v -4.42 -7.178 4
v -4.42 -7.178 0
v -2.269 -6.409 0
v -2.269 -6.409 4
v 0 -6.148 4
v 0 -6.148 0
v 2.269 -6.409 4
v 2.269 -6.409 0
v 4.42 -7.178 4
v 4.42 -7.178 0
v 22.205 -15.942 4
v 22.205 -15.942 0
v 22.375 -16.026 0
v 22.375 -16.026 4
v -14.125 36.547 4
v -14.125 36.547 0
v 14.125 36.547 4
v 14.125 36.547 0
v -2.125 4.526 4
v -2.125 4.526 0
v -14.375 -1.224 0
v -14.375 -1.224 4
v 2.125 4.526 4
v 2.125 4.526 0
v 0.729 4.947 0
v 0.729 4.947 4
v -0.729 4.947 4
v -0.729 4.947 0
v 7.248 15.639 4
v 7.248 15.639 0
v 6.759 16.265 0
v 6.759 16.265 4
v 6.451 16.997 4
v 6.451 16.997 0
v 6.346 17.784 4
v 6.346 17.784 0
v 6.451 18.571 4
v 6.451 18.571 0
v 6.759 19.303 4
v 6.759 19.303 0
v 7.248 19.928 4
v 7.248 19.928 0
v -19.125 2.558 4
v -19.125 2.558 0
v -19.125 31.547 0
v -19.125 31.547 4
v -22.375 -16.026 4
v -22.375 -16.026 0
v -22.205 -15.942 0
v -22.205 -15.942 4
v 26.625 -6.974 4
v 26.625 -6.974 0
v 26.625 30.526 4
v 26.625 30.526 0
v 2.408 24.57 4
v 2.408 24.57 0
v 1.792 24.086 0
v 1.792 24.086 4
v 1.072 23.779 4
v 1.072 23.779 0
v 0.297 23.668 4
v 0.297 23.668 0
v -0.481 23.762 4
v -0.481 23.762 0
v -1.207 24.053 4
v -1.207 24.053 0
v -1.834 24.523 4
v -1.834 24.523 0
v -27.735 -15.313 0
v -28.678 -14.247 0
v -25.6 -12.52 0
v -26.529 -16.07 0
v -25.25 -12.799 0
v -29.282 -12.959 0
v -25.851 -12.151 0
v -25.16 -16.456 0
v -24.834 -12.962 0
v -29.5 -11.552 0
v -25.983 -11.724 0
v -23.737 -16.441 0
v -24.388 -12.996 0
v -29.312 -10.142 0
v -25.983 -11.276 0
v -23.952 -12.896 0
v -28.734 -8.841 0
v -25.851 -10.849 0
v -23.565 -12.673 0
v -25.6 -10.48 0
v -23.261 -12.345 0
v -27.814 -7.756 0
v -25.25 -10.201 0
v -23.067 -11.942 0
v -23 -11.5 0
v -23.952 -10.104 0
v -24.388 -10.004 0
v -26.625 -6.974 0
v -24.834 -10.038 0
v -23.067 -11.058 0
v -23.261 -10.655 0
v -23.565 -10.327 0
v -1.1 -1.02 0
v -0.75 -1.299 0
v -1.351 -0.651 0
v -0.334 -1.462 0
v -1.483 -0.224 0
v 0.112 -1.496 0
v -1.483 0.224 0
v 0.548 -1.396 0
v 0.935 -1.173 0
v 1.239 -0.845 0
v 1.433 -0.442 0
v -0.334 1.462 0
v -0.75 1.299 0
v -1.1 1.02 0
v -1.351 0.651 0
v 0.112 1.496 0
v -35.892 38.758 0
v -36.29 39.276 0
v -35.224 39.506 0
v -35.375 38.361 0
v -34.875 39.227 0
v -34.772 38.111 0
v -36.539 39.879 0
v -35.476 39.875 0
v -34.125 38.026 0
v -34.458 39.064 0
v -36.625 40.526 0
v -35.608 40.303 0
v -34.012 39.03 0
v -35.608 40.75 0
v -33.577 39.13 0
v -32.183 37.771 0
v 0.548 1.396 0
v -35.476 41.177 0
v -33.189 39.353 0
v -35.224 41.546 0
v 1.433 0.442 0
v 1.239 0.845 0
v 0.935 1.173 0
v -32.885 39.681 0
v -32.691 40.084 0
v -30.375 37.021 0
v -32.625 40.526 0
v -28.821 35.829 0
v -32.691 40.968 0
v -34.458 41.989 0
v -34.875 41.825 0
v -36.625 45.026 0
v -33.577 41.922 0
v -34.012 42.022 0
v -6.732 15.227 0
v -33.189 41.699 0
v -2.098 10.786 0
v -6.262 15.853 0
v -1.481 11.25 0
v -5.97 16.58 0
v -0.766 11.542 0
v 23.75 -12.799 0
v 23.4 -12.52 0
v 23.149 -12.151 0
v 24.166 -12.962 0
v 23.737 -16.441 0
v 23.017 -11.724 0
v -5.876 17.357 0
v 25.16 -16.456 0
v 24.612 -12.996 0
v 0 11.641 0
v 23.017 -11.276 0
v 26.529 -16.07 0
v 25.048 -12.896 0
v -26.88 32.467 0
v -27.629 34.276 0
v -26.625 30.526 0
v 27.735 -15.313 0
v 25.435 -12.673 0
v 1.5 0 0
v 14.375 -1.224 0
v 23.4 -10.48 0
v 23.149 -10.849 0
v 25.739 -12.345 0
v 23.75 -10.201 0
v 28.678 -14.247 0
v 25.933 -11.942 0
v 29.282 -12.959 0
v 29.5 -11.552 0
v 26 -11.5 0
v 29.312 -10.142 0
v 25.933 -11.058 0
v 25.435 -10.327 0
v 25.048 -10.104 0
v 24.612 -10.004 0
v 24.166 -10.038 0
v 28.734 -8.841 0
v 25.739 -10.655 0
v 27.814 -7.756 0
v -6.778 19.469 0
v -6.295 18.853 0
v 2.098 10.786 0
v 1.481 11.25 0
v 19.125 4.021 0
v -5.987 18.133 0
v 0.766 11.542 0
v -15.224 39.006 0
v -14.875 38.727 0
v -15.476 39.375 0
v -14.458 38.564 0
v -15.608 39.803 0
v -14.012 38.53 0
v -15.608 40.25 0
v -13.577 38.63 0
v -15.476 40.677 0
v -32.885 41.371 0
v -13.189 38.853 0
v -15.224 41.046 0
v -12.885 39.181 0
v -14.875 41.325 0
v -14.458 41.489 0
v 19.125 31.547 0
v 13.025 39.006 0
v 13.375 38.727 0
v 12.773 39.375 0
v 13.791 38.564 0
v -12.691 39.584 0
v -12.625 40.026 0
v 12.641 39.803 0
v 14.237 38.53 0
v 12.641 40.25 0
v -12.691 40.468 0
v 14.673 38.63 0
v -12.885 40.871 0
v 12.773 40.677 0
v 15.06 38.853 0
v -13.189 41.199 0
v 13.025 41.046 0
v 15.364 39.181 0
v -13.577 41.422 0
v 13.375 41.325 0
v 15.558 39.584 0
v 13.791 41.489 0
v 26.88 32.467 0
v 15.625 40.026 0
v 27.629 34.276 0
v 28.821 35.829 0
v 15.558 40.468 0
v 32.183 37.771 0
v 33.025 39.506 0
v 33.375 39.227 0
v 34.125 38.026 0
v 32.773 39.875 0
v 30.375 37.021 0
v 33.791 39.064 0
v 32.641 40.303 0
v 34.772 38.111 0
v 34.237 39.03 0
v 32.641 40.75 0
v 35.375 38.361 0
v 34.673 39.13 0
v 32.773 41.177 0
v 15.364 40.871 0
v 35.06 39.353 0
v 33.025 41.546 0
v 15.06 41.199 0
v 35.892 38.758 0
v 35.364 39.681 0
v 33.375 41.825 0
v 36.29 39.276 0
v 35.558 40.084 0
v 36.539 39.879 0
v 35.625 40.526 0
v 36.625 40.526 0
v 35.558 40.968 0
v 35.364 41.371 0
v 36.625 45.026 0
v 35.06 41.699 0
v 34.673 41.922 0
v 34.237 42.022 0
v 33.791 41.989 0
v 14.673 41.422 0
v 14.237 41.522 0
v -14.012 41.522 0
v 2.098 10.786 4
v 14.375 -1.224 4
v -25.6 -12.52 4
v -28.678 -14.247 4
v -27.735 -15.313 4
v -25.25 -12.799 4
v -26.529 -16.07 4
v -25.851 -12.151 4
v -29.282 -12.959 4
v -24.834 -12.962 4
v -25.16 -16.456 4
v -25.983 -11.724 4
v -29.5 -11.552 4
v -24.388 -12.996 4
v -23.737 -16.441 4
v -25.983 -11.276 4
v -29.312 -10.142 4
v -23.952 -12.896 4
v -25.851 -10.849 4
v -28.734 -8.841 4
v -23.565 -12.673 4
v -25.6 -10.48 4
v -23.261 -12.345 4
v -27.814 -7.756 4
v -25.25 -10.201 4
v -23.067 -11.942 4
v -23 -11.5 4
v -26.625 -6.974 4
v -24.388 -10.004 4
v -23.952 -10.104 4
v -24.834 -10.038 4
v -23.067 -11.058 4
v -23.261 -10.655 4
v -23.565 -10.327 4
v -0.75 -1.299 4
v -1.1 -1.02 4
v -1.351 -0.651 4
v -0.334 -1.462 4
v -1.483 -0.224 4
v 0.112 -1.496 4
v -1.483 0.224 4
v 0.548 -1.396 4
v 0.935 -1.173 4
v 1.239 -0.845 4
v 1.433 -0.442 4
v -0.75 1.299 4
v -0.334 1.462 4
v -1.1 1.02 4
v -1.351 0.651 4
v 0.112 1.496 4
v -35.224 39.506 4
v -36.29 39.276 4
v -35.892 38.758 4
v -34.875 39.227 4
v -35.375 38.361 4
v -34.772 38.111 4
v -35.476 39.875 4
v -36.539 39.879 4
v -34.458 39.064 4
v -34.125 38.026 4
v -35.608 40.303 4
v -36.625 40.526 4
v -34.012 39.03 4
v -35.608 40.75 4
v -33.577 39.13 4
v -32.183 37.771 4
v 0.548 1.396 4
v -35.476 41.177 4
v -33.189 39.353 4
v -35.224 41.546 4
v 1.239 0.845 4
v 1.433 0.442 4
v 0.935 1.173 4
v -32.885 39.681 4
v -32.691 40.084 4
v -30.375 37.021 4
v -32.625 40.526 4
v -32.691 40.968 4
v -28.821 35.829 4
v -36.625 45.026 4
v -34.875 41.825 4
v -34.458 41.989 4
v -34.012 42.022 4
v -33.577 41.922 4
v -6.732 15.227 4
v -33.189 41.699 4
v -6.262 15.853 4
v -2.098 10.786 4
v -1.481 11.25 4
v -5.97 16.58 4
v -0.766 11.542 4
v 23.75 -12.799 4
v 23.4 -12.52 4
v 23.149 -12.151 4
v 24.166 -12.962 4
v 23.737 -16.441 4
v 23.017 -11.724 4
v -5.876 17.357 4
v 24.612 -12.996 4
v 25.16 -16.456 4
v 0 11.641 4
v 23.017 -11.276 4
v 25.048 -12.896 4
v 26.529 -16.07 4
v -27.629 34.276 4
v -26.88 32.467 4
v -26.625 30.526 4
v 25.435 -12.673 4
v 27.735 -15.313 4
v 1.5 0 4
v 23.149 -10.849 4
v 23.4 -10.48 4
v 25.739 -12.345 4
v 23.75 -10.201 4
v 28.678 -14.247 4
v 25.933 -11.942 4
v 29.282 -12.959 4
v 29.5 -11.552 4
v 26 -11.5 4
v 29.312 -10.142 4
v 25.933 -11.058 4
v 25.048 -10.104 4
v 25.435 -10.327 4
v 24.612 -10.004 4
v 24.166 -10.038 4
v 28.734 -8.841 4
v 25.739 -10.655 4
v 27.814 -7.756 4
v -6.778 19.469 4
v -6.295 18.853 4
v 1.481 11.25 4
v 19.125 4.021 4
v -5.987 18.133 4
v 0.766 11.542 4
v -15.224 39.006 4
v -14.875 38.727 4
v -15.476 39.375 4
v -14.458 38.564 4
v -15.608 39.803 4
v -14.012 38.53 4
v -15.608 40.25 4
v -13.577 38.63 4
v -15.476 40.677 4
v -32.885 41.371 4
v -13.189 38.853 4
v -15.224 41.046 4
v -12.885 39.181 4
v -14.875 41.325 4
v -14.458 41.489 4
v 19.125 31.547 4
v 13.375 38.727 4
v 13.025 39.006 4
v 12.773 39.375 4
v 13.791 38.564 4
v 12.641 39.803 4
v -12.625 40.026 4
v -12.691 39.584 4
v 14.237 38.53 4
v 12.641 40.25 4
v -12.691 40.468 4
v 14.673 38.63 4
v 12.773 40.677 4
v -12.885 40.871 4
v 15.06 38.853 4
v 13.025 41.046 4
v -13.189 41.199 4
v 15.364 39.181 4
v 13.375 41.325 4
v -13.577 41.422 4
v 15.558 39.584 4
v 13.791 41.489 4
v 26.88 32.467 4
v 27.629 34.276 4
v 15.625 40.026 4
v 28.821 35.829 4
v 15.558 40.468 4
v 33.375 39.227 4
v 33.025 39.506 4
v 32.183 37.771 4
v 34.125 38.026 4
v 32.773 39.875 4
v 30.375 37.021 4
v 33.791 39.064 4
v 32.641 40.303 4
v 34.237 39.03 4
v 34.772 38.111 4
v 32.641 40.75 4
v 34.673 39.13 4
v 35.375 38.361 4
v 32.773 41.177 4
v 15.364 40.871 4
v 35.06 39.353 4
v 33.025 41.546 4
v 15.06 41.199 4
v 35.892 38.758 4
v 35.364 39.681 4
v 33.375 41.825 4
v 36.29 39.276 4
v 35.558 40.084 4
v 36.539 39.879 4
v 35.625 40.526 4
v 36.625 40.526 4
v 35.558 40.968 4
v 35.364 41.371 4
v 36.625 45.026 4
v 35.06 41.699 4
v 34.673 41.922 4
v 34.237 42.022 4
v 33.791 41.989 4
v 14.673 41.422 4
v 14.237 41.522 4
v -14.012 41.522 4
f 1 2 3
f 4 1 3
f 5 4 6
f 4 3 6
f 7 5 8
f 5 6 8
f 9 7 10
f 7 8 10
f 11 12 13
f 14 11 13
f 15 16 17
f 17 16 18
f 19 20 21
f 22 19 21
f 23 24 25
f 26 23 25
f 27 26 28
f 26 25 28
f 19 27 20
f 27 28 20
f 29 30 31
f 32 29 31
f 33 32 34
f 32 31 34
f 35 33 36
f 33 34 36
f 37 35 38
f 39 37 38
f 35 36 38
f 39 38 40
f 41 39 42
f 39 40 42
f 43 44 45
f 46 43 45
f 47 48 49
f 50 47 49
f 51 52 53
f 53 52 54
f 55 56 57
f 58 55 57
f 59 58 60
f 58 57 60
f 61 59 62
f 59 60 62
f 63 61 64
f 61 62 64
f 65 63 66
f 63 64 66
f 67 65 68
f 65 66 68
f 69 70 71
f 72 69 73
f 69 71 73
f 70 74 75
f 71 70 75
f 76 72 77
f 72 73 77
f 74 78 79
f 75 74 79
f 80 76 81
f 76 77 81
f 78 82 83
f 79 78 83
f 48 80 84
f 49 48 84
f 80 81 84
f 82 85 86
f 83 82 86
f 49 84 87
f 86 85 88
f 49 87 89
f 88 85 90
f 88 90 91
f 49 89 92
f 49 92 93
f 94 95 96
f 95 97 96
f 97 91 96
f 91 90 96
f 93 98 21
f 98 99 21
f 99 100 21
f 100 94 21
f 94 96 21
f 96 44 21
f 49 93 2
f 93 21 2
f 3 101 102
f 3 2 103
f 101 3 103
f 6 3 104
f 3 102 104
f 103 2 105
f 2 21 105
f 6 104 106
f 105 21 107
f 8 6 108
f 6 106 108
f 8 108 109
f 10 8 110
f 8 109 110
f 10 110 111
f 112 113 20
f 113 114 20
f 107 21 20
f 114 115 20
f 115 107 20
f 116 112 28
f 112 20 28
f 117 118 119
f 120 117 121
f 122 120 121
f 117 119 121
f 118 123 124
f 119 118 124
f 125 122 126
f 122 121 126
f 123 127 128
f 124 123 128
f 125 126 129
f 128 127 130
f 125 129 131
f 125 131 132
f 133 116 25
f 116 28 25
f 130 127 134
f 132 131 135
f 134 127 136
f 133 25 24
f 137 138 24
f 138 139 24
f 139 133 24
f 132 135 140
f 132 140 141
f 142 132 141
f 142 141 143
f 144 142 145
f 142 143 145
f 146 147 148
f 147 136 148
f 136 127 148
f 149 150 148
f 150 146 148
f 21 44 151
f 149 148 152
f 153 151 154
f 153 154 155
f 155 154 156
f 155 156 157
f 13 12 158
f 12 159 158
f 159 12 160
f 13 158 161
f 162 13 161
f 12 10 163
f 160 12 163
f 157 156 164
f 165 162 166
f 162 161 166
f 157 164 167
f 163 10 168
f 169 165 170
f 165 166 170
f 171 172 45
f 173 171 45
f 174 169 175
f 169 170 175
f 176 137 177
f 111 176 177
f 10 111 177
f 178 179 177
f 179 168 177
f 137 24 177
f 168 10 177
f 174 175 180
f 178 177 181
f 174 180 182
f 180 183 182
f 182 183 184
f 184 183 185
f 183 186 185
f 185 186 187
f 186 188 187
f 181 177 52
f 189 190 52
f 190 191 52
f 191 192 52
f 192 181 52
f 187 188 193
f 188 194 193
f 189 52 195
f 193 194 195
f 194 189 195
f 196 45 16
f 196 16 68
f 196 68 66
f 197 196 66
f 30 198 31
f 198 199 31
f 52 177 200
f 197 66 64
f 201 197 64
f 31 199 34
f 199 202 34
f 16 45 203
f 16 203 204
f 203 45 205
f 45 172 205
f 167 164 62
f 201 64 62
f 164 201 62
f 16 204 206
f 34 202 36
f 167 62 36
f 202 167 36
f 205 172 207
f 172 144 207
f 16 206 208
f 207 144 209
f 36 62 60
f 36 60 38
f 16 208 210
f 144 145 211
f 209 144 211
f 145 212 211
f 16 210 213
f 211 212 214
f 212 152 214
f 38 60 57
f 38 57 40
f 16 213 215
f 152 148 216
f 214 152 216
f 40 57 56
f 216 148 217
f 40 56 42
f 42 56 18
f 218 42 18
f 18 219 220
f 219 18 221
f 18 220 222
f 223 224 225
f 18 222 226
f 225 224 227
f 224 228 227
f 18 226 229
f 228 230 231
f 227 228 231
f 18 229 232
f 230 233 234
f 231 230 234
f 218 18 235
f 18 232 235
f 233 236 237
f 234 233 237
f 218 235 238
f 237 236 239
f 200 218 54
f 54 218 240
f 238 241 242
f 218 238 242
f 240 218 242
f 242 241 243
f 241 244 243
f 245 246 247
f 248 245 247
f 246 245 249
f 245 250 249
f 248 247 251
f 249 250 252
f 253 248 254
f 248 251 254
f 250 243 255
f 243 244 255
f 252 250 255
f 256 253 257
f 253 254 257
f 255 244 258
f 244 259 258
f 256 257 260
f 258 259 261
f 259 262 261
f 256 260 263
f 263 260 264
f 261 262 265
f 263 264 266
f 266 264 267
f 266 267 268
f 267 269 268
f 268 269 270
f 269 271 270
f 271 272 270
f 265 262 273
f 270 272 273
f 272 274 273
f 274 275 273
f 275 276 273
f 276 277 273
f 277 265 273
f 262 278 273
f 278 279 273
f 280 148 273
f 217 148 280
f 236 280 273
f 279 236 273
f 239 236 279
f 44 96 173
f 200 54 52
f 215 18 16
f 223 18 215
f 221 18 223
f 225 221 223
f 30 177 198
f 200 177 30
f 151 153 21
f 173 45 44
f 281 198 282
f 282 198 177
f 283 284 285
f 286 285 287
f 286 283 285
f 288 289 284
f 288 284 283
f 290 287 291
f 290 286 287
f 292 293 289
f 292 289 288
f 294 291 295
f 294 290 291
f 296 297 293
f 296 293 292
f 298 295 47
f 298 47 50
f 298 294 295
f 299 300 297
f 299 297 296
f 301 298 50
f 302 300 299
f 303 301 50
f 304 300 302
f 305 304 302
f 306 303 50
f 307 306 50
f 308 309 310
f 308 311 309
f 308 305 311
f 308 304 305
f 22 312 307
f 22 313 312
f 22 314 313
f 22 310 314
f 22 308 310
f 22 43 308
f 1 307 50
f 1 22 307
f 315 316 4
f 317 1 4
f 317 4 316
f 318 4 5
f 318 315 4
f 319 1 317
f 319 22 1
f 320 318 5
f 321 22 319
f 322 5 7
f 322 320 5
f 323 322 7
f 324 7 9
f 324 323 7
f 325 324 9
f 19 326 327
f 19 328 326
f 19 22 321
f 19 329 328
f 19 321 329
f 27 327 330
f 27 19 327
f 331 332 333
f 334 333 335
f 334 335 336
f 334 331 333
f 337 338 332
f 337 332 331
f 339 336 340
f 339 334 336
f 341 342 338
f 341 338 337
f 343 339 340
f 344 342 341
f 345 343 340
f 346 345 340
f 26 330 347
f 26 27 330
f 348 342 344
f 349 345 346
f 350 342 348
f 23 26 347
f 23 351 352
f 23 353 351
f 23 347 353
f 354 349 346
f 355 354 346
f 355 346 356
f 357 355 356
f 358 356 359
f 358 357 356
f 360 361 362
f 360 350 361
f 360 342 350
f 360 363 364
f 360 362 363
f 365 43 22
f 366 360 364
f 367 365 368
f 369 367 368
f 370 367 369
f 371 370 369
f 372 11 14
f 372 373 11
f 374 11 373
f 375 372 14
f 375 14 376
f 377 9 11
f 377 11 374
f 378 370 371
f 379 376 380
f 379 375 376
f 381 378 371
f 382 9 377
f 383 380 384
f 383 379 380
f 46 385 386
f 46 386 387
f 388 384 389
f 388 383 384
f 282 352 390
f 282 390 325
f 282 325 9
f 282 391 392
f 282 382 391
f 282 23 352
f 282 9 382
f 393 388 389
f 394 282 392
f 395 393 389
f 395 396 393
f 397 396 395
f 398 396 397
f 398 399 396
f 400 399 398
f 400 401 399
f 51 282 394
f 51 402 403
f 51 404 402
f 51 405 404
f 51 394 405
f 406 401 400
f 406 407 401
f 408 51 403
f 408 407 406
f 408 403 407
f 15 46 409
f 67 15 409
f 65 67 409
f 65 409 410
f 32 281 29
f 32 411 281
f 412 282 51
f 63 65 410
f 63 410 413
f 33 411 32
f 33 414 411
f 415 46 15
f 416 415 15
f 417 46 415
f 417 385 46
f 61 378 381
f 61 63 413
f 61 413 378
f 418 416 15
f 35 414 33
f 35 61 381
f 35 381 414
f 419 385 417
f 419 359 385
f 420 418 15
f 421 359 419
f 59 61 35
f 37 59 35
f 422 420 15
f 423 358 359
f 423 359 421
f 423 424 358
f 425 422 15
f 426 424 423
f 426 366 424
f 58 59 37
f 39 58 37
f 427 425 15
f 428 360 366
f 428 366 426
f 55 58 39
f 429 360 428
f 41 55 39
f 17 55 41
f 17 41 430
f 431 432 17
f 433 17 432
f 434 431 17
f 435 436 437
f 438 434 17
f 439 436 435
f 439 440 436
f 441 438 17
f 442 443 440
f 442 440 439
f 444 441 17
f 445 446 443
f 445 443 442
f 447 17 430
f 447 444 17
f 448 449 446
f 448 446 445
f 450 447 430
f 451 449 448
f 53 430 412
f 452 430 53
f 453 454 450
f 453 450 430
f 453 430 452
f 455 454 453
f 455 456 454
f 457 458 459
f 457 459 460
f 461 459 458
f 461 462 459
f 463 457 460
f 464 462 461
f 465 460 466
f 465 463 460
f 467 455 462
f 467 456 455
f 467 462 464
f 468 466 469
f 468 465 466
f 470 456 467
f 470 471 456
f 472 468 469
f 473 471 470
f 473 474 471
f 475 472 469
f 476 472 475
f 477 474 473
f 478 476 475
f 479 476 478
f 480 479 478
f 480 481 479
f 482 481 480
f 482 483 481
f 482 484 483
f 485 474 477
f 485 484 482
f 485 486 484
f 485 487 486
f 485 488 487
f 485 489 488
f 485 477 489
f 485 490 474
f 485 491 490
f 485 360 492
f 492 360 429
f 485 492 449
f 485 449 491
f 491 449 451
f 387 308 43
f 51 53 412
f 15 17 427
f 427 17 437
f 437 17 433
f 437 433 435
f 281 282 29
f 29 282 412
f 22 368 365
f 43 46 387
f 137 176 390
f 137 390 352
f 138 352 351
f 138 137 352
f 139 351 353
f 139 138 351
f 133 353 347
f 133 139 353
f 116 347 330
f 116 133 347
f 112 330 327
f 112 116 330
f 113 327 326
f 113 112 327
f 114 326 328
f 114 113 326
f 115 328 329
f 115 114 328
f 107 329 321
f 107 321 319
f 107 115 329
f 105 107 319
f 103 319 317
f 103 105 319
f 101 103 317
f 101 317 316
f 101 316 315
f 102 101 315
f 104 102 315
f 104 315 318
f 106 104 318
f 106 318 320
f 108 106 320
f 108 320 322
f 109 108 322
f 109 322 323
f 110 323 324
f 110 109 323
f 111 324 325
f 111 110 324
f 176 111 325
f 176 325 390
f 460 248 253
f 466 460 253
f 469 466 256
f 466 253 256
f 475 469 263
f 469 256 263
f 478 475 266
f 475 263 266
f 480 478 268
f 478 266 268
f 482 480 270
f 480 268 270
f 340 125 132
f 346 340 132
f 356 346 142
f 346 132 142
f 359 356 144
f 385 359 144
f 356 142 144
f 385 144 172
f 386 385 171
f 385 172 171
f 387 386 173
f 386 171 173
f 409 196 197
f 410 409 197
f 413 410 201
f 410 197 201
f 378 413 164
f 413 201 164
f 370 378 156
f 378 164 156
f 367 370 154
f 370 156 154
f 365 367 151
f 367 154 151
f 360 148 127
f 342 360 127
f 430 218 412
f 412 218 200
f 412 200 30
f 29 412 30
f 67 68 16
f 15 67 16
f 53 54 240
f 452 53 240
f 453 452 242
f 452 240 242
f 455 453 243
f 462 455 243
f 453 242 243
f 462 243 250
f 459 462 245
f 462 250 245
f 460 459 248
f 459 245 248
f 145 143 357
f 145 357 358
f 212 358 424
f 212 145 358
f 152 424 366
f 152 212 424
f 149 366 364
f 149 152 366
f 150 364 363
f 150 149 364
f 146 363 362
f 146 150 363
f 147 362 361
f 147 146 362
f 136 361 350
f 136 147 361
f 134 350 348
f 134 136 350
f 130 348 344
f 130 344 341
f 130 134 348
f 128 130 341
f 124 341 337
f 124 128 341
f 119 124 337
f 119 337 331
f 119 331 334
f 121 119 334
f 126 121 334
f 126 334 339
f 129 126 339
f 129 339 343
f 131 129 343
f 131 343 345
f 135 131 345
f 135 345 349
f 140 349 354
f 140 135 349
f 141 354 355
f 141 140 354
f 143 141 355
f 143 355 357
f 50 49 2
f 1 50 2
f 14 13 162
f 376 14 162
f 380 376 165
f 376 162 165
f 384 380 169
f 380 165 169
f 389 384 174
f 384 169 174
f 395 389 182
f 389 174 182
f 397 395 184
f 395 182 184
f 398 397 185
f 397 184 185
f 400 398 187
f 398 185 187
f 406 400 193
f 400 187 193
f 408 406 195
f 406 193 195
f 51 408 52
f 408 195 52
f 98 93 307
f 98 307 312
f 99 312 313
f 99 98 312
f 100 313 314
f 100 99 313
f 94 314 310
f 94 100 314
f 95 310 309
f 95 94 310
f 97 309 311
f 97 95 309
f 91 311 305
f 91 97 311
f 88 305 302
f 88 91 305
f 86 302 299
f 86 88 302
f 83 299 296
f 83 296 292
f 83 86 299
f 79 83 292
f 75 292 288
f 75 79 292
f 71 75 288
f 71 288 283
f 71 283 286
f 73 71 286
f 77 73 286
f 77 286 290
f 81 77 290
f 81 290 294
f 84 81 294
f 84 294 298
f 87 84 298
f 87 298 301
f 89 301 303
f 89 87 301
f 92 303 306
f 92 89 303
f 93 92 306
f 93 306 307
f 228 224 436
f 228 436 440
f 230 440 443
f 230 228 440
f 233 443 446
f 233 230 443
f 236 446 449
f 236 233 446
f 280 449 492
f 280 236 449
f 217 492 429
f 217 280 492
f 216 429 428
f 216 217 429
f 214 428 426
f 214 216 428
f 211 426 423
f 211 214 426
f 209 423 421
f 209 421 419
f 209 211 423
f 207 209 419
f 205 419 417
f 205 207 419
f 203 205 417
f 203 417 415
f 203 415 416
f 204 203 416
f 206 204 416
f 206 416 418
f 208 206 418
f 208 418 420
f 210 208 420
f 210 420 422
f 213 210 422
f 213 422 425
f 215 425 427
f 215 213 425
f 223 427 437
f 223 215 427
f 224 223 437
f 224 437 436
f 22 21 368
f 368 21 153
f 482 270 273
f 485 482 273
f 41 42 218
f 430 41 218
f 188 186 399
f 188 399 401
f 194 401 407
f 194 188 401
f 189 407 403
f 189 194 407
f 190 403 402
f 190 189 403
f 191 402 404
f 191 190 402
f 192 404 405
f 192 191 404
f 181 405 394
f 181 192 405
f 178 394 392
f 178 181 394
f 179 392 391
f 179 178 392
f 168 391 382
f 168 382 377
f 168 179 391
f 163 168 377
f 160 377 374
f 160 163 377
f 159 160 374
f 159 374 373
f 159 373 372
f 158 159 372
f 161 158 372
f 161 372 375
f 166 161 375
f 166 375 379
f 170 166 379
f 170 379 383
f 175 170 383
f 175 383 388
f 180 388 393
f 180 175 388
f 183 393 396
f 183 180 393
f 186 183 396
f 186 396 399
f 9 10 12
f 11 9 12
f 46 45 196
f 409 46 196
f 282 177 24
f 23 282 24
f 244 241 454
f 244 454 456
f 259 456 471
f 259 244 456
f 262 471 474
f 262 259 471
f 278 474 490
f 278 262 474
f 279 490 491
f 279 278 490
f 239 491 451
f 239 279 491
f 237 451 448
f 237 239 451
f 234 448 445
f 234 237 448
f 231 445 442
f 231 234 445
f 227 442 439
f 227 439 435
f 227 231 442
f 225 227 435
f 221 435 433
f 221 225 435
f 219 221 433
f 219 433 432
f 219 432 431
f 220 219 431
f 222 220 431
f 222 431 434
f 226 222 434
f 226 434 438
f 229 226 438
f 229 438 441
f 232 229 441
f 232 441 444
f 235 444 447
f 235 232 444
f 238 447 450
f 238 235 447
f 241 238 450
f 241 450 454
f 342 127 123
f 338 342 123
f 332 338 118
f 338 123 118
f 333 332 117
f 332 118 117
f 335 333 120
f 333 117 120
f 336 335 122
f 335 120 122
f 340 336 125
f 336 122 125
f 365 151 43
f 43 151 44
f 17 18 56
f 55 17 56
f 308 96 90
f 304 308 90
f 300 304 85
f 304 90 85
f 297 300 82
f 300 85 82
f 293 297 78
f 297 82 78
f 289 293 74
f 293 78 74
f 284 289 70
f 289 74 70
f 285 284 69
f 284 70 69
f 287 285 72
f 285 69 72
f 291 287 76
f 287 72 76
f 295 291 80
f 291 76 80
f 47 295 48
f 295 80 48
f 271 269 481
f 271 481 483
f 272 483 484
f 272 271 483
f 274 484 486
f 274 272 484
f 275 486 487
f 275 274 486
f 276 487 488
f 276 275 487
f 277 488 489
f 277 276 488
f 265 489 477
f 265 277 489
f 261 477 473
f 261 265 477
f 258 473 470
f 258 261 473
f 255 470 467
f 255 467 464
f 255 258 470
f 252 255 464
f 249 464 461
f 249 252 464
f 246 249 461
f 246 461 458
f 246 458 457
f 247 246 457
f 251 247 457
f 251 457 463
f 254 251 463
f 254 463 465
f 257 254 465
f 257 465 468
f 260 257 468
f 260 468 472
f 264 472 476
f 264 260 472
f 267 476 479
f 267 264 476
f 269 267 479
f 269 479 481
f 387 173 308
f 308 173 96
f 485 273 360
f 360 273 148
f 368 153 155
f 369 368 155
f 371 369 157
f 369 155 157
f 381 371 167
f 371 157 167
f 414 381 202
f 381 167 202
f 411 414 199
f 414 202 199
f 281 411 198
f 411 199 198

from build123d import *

# Parameters (mm, degrees)
SKETCH1_R           = 1.5
BOSS_EXTRUDE1_DEPTH = 4


with BuildPart() as part:
    # Sketch1 → Boss-Extrude1 (new body)
    # profile 1 of 2: a face of its own
    with BuildSketch(Plane.XY):
        with BuildLine():
            Line((0, 43.02618472), (-22, 43.02618472))
            Line((-22, 43.02618472), (-34.124535685, 43.02618472))
            ThreePointArc((-34.124535685, 43.02618472), (-35.892302638, 42.293951673), (-36.624535685, 40.52618472))
            ThreePointArc((-36.624535685, 40.52618472), (-35.892302638, 38.758417767), (-34.124535685, 38.02618472))
            ThreePointArc((-34.124535685, 38.02618472), (-28.821234826, 35.829485579), (-26.624535685, 30.52618472))
            Line((-26.624535685, 30.52618472), (-26.624535685, -6.97381528))
            ThreePointArc((-26.624535685, -6.97381528), (-29.02618472, -13.624535685), (-22.375464315, -16.02618472))
            Line((-22.375464315, -16.02618472), (-22.205082013, -15.942223704))
            Line((-22.205082013, -15.942223704), (-4.420251148, -7.178212035))
            ThreePointArc((-4.420251148, -7.178212035), (0, -6.148238779), (4.420251148, -7.178212035))
            Line((4.420251148, -7.178212035), (22.205082013, -15.942223704))
            Line((22.205082013, -15.942223704), (22.375464315, -16.02618472))
            ThreePointArc((22.375464315, -16.02618472), (29.02618472, -13.624535685), (26.624535685, -6.97381528))
            Line((26.624535685, -6.97381528), (26.624535685, 30.52618472))
            ThreePointArc((26.624535685, 30.52618472), (28.821234826, 35.829485579), (34.124535685, 38.02618472))
            ThreePointArc((34.124535685, 38.02618472), (35.892302638, 38.758417767), (36.624535685, 40.52618472))
            ThreePointArc((36.624535685, 40.52618472), (35.892302638, 42.293951673), (34.124535685, 43.02618472))
            Line((34.124535685, 43.02618472), (22, 43.02618472))
            Line((22, 43.02618472), (0, 43.02618472))
        make_face()
        with Locations((-24.5, -11.5)):
            Circle(SKETCH1_R, mode=Mode.SUBTRACT)
        Circle(SKETCH1_R, mode=Mode.SUBTRACT)
        with Locations((24.5, -11.5)):
            Circle(SKETCH1_R, mode=Mode.SUBTRACT)
        with BuildLine():
            Line((14.374535685, -1.22381528), (2.124535685, 4.52618472))
            ThreePointArc((2.124535685, 4.52618472), (0, 5), (-2.124535685, 4.52618472))
            Line((-2.124535685, 4.52618472), (-14.374535685, -1.22381528))
            Line((-14.374535685, -1.22381528), (-2.097868645, 10.785812849))
            ThreePointArc((-2.097868645, 10.785812849), (0, 11.641297251), (2.097868645, 10.785812849))
            Line((2.097868645, 10.785812849), (14.374535685, -1.22381528))
        make_face(mode=Mode.SUBTRACT)
        with BuildLine():
            Line((-6.73171968, 15.226590291), (-19.124535685, 2.558215038))
            Line((-19.124535685, 2.558215038), (-19.124535685, 31.546592884))
            Line((-19.124535685, 31.546592884), (-6.778366633, 19.468974534))
            ThreePointArc((-6.778366633, 19.468974534), (-5.876416612, 17.357443313), (-6.73171968, 15.226590291))
        make_face(mode=Mode.SUBTRACT)
        with Locations((-34.124535685, 40.52618472)):
            Circle(SKETCH1_R, mode=Mode.SUBTRACT)
        with BuildLine():
            Line((-1.833941699, 24.523340745), (-14.124535685, 36.546592884))
            Line((-14.124535685, 36.546592884), (14.124535685, 36.546592884))
            Line((14.124535685, 36.546592884), (2.408442543, 24.569987698))
            ThreePointArc((2.408442543, 24.569987698), (0.296911322, 23.668037677), (-1.833941699, 24.523340745))
        make_face(mode=Mode.SUBTRACT)
        with Locations((-14.124535685, 40.02618472)):
            Circle(SKETCH1_R, mode=Mode.SUBTRACT)
        with BuildLine():
            Line((19.124535685, 31.546592884), (19.124535685, 4.020746784))
            Line((19.124535685, 4.020746784), (7.24778827, 15.639154236))
            ThreePointArc((7.24778827, 15.639154236), (6.345656915, 17.783669834), (7.24778827, 19.928185432))
            Line((7.24778827, 19.928185432), (19.124535685, 31.546592884))
        make_face(mode=Mode.SUBTRACT)
        with Locations((14.124535685, 40.02618472)):
            Circle(SKETCH1_R, mode=Mode.SUBTRACT)
        with Locations((34.124535685, 40.52618472)):
            Circle(SKETCH1_R, mode=Mode.SUBTRACT)
    # profile 2 of 2: a face of its own
    with BuildSketch(Plane.XY):
        with BuildLine():
            Line((-34.124535685, 43.02618472), (-22, 43.02618472))
            Line((-22, 43.02618472), (0, 43.02618472))
            Line((0, 43.02618472), (22, 43.02618472))
            Line((22, 43.02618472), (34.124535685, 43.02618472))
            ThreePointArc((34.124535685, 43.02618472), (35.892302638, 42.293951673), (36.624535685, 40.52618472))
            Line((36.624535685, 40.52618472), (36.624535685, 45.02618472))
            Line((36.624535685, 45.02618472), (-36.624535685, 45.02618472))
            Line((-36.624535685, 45.02618472), (-36.624535685, 40.52618472))
            ThreePointArc((-36.624535685, 40.52618472), (-35.892302638, 42.293951673), (-34.124535685, 43.02618472))
        make_face()
    extrude(amount=BOSS_EXTRUDE1_DEPTH)


solid = part.part
